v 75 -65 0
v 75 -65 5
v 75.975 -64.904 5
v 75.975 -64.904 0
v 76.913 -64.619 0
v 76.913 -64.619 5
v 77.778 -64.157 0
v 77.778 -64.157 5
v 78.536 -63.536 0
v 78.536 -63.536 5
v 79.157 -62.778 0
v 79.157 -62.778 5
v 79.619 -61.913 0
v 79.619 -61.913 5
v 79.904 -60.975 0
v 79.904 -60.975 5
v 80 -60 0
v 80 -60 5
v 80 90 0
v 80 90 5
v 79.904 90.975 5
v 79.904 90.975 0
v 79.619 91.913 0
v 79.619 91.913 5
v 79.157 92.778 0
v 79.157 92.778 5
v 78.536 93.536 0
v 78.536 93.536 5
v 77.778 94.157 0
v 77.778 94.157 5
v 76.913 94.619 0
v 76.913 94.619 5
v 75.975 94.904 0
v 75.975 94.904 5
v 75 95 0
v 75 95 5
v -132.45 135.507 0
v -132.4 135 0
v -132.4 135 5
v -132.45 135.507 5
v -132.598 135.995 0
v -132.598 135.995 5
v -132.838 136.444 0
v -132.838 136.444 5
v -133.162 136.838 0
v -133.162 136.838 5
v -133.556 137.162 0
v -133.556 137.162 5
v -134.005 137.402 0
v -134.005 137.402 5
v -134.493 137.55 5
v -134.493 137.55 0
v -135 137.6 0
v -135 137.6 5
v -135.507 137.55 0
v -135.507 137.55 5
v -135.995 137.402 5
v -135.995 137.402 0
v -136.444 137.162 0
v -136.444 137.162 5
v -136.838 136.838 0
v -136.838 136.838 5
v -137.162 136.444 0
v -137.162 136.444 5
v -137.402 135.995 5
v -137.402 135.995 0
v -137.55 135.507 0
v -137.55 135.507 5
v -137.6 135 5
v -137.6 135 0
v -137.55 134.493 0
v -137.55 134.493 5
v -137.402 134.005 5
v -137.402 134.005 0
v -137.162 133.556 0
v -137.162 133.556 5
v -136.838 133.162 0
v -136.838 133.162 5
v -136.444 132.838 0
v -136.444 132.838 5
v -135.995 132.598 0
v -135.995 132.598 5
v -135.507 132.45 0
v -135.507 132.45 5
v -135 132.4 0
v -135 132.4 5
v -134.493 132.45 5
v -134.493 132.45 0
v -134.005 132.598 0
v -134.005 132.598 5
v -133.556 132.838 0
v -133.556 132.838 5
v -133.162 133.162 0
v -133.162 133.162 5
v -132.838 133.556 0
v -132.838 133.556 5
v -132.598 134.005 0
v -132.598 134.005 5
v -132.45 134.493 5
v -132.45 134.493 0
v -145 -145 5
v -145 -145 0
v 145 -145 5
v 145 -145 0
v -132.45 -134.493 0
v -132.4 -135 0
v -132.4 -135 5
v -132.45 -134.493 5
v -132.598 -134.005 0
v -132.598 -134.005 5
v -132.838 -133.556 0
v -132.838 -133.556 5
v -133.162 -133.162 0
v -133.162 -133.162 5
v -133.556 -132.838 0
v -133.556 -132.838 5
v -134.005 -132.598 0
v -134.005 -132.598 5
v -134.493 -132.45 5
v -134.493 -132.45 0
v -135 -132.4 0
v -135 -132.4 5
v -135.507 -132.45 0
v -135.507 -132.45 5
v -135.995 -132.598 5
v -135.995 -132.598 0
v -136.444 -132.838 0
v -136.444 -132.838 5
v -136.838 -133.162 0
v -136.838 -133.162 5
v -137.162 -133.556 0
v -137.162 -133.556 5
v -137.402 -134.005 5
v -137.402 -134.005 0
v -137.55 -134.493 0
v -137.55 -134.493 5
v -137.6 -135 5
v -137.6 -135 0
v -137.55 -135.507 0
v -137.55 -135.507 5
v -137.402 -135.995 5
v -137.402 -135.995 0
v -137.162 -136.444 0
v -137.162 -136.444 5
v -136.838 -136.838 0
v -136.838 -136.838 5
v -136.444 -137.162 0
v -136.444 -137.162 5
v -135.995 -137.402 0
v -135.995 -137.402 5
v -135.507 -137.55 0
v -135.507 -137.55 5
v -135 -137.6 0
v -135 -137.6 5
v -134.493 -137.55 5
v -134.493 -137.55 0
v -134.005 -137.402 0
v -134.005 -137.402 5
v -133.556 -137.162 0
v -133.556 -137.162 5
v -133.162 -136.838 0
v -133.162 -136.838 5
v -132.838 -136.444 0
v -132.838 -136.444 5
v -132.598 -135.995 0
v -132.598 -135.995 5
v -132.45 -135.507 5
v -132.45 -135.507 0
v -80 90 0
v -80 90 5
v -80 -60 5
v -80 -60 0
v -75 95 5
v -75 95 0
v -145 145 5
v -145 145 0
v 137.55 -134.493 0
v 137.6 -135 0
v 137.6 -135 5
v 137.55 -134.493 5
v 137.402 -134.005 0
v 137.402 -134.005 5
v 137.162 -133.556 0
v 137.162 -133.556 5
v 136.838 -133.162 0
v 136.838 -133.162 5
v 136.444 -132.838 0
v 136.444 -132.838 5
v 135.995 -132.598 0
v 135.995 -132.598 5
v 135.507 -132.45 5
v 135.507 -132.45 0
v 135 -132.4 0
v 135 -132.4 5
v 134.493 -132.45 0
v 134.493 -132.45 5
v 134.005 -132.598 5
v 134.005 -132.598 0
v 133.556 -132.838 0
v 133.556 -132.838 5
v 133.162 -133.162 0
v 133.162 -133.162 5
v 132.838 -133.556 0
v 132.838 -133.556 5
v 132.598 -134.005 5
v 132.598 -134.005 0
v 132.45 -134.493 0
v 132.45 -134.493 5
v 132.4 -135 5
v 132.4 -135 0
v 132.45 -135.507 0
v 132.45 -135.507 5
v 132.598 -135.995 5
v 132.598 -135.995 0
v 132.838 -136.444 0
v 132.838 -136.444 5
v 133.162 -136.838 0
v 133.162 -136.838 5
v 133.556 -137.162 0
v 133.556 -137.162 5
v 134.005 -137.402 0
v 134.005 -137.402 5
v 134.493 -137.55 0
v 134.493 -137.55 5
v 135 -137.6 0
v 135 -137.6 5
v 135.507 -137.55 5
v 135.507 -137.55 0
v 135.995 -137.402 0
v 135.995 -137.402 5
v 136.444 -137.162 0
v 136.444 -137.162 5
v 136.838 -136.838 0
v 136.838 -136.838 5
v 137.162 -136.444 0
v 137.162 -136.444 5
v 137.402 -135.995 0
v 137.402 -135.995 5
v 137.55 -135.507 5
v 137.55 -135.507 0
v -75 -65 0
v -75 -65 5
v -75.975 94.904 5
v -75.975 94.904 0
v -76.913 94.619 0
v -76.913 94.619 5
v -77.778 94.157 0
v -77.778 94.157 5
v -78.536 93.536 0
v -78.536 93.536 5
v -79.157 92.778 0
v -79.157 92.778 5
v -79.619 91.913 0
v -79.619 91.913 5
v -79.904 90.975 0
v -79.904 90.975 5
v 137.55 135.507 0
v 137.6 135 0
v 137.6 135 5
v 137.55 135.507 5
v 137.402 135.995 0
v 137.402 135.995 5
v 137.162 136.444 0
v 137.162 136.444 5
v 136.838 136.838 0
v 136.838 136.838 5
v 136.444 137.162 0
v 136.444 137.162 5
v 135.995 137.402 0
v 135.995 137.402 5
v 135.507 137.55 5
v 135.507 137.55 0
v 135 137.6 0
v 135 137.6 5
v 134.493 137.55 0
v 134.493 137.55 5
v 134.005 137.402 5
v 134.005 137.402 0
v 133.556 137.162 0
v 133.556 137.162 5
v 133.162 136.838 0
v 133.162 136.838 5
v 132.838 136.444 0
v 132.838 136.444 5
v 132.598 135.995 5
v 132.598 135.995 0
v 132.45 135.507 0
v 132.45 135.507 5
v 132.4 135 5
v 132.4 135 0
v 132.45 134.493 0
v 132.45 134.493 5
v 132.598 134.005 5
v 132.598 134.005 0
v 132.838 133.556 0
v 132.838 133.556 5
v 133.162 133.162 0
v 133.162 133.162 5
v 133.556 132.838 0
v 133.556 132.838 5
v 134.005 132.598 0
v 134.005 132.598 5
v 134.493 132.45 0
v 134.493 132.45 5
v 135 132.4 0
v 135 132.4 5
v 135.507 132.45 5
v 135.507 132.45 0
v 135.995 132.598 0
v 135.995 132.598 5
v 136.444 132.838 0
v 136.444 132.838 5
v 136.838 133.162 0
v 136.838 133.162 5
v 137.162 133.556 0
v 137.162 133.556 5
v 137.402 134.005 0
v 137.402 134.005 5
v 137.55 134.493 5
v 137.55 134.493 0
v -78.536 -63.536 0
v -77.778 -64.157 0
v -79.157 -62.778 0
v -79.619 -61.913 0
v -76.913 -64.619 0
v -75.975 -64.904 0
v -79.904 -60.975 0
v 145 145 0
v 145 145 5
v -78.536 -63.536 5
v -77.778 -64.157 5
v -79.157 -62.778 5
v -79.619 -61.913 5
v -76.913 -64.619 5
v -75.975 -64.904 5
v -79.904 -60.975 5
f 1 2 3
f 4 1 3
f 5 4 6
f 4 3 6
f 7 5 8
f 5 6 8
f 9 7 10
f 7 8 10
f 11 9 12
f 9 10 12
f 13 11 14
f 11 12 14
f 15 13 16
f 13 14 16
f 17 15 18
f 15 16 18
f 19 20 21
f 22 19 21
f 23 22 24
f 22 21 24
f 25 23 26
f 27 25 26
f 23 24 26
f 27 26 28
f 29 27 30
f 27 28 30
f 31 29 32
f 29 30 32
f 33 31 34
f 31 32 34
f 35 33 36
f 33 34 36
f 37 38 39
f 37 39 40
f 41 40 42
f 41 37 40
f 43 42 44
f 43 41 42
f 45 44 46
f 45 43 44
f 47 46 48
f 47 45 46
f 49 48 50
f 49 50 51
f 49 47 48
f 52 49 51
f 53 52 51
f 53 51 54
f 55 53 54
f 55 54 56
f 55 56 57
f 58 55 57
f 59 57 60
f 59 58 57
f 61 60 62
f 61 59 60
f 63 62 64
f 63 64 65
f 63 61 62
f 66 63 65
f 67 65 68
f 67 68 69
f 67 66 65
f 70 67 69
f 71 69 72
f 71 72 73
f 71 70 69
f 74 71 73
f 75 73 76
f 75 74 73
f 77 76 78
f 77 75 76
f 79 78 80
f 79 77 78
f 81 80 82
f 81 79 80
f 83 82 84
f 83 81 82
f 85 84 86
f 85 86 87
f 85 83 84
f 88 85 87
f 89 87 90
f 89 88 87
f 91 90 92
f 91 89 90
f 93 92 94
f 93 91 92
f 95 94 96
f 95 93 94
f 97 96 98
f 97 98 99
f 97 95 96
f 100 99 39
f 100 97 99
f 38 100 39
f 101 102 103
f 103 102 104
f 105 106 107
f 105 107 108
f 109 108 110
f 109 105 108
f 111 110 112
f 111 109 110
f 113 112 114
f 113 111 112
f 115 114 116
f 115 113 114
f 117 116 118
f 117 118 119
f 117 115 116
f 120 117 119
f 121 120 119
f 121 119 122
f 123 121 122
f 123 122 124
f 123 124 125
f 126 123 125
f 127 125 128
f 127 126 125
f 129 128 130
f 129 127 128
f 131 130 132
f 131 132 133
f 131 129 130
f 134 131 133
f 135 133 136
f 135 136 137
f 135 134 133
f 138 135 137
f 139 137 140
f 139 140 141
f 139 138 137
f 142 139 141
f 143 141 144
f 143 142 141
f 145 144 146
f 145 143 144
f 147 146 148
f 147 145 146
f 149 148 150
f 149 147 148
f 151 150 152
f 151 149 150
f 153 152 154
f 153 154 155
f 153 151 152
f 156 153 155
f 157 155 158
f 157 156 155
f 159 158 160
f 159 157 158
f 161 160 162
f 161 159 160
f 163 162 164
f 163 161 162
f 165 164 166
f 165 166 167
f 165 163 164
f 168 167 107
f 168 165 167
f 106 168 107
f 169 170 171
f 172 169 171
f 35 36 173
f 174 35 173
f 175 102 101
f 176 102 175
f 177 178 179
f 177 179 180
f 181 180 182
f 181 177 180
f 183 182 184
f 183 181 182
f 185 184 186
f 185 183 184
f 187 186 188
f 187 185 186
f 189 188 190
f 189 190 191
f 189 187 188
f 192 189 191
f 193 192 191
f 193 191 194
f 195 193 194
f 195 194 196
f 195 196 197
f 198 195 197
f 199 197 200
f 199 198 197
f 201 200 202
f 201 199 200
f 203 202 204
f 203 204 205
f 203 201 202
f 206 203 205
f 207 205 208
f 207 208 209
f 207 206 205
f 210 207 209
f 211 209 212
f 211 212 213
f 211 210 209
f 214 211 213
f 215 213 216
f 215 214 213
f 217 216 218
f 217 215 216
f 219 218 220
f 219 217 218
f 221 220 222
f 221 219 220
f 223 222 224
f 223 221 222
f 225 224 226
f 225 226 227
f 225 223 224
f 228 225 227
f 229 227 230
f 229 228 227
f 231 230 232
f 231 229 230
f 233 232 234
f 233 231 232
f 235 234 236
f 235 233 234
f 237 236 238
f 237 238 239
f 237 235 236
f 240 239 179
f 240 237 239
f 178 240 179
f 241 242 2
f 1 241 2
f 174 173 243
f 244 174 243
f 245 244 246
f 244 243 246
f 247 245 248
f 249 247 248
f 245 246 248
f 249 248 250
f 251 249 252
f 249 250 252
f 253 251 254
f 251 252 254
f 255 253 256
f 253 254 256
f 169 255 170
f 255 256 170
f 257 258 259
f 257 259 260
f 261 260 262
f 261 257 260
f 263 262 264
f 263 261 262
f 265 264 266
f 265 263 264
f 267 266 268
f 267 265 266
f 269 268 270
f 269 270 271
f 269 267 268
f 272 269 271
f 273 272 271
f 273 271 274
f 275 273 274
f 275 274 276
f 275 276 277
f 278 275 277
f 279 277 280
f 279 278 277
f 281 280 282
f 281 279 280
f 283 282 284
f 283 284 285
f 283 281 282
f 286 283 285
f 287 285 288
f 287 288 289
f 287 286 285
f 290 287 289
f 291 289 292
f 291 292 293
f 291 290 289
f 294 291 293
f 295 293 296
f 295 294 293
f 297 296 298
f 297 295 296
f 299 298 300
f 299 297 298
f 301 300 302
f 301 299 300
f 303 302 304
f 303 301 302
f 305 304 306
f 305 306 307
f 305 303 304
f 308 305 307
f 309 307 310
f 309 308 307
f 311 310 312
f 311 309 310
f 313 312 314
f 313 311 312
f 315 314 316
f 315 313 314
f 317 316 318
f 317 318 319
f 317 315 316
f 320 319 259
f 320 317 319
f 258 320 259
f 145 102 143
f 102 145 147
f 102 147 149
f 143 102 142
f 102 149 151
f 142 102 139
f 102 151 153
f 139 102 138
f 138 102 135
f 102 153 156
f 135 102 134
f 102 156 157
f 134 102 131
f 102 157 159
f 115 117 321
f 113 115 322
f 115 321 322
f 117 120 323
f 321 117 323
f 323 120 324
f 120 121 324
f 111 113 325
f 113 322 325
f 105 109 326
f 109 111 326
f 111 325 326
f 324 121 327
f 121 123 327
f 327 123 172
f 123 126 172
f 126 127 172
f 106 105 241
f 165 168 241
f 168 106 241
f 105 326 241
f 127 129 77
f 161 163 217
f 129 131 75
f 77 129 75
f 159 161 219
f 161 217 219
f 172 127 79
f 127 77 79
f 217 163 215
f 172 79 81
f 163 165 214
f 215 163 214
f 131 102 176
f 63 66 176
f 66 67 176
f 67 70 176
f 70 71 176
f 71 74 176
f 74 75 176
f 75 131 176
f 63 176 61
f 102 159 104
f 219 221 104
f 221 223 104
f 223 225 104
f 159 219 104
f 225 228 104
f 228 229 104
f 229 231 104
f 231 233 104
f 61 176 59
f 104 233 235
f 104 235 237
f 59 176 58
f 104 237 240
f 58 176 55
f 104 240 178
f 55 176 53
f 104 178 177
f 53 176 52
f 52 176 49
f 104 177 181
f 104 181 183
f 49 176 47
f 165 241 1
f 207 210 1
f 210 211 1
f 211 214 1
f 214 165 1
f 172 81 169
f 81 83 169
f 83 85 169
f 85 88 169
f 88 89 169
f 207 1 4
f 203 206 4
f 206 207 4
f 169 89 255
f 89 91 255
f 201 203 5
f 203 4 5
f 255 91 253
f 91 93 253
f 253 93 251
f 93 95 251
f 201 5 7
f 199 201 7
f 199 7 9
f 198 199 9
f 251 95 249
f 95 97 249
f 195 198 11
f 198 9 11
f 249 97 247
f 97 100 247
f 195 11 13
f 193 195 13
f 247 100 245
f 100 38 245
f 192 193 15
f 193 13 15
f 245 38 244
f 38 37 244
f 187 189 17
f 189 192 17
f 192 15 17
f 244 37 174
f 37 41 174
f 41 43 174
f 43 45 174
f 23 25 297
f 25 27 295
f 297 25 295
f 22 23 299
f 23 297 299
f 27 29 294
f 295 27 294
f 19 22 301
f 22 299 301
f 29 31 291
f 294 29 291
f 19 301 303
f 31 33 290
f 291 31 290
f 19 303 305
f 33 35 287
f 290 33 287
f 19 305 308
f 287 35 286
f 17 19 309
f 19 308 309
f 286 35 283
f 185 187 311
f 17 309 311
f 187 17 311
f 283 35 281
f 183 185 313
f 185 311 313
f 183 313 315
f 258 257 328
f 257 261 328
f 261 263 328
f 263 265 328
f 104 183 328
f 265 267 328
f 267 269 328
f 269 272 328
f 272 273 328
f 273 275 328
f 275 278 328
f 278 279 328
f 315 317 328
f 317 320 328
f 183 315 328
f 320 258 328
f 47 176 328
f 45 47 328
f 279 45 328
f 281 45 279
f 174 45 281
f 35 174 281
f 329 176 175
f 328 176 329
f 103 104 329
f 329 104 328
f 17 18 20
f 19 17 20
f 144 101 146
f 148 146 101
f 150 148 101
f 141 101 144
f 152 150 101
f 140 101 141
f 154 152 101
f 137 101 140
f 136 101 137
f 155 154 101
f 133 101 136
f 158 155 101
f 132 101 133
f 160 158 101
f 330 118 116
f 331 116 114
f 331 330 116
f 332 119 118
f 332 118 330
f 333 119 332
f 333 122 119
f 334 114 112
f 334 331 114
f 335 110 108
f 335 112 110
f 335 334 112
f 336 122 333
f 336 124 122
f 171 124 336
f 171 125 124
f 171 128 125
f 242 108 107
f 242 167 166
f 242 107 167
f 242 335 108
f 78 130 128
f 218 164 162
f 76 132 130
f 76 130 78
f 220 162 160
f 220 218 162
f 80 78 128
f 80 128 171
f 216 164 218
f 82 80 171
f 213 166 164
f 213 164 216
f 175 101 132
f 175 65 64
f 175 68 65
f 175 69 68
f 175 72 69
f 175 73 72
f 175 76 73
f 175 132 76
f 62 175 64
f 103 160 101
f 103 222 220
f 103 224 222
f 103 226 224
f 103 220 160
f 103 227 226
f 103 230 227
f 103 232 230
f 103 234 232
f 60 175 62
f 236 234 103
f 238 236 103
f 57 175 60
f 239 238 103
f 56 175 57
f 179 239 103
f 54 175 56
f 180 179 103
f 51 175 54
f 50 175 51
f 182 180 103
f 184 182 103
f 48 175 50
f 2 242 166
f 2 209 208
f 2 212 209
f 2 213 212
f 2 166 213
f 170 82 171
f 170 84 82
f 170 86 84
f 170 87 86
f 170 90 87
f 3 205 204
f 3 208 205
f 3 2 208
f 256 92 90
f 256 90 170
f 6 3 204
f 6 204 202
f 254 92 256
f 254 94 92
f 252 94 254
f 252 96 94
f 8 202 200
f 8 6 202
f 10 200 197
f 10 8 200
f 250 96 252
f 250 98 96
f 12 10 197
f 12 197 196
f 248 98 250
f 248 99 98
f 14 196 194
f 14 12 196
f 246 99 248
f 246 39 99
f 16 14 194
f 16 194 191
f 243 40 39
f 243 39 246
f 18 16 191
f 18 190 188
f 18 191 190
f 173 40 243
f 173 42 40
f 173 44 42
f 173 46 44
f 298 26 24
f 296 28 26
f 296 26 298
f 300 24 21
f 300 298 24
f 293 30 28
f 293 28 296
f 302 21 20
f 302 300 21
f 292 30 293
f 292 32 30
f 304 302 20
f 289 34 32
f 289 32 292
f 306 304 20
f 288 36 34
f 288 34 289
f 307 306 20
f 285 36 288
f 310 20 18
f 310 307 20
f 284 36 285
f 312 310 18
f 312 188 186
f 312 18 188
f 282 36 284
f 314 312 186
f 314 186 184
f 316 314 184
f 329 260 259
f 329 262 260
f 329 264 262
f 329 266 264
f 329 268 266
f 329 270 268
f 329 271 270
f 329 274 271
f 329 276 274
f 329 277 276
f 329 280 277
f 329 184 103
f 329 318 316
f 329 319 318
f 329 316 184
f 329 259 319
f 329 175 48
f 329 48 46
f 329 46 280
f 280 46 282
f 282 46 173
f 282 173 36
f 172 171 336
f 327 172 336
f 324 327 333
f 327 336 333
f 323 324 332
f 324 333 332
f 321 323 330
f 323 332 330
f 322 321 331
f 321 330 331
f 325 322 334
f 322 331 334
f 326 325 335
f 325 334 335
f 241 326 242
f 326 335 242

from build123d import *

# Parameters (mm, degrees)
F0_W     = 290
F0_H     = 290
F0_R     = 2.6
F1_DEPTH = 5
F3_DEPTH = 5.001


with BuildPart() as f1:
    # F0 (on Top) → F1 (new body)
    with BuildSketch(Plane.XY):
        Rectangle(F0_W, F0_H)
        with Locations((-135, -135)):
            Circle(F0_R, mode=Mode.SUBTRACT)
        with Locations((135, -135)):
            Circle(F0_R, mode=Mode.SUBTRACT)
        with Locations((-135, 135)):
            Circle(F0_R, mode=Mode.SUBTRACT)
        with Locations((135, 135)):
            Circle(F0_R, mode=Mode.SUBTRACT)
    extrude(amount=F1_DEPTH)

    # F2 (on face) → F3 (cut, through all)
    with BuildSketch(Plane.XY.offset(5)):
        with BuildLine():
            Line((-75, -65), (75, -65))
            ThreePointArc((75, -65), (78.535534, -63.535534), (80, -60))
            Line((80, -60), (80, 90))
            ThreePointArc((80, 90), (78.535534, 93.535534), (75, 95))
            Line((75, 95), (-75, 95))
            ThreePointArc((-75, 95), (-78.535534, 93.535534), (-80, 90))
            Line((-80, 90), (-80, -60))
            ThreePointArc((-80, -60), (-78.535534, -63.535534), (-75, -65))
        make_face()
    extrude(amount=-F3_DEPTH, mode=Mode.SUBTRACT)


solid = f1.part
